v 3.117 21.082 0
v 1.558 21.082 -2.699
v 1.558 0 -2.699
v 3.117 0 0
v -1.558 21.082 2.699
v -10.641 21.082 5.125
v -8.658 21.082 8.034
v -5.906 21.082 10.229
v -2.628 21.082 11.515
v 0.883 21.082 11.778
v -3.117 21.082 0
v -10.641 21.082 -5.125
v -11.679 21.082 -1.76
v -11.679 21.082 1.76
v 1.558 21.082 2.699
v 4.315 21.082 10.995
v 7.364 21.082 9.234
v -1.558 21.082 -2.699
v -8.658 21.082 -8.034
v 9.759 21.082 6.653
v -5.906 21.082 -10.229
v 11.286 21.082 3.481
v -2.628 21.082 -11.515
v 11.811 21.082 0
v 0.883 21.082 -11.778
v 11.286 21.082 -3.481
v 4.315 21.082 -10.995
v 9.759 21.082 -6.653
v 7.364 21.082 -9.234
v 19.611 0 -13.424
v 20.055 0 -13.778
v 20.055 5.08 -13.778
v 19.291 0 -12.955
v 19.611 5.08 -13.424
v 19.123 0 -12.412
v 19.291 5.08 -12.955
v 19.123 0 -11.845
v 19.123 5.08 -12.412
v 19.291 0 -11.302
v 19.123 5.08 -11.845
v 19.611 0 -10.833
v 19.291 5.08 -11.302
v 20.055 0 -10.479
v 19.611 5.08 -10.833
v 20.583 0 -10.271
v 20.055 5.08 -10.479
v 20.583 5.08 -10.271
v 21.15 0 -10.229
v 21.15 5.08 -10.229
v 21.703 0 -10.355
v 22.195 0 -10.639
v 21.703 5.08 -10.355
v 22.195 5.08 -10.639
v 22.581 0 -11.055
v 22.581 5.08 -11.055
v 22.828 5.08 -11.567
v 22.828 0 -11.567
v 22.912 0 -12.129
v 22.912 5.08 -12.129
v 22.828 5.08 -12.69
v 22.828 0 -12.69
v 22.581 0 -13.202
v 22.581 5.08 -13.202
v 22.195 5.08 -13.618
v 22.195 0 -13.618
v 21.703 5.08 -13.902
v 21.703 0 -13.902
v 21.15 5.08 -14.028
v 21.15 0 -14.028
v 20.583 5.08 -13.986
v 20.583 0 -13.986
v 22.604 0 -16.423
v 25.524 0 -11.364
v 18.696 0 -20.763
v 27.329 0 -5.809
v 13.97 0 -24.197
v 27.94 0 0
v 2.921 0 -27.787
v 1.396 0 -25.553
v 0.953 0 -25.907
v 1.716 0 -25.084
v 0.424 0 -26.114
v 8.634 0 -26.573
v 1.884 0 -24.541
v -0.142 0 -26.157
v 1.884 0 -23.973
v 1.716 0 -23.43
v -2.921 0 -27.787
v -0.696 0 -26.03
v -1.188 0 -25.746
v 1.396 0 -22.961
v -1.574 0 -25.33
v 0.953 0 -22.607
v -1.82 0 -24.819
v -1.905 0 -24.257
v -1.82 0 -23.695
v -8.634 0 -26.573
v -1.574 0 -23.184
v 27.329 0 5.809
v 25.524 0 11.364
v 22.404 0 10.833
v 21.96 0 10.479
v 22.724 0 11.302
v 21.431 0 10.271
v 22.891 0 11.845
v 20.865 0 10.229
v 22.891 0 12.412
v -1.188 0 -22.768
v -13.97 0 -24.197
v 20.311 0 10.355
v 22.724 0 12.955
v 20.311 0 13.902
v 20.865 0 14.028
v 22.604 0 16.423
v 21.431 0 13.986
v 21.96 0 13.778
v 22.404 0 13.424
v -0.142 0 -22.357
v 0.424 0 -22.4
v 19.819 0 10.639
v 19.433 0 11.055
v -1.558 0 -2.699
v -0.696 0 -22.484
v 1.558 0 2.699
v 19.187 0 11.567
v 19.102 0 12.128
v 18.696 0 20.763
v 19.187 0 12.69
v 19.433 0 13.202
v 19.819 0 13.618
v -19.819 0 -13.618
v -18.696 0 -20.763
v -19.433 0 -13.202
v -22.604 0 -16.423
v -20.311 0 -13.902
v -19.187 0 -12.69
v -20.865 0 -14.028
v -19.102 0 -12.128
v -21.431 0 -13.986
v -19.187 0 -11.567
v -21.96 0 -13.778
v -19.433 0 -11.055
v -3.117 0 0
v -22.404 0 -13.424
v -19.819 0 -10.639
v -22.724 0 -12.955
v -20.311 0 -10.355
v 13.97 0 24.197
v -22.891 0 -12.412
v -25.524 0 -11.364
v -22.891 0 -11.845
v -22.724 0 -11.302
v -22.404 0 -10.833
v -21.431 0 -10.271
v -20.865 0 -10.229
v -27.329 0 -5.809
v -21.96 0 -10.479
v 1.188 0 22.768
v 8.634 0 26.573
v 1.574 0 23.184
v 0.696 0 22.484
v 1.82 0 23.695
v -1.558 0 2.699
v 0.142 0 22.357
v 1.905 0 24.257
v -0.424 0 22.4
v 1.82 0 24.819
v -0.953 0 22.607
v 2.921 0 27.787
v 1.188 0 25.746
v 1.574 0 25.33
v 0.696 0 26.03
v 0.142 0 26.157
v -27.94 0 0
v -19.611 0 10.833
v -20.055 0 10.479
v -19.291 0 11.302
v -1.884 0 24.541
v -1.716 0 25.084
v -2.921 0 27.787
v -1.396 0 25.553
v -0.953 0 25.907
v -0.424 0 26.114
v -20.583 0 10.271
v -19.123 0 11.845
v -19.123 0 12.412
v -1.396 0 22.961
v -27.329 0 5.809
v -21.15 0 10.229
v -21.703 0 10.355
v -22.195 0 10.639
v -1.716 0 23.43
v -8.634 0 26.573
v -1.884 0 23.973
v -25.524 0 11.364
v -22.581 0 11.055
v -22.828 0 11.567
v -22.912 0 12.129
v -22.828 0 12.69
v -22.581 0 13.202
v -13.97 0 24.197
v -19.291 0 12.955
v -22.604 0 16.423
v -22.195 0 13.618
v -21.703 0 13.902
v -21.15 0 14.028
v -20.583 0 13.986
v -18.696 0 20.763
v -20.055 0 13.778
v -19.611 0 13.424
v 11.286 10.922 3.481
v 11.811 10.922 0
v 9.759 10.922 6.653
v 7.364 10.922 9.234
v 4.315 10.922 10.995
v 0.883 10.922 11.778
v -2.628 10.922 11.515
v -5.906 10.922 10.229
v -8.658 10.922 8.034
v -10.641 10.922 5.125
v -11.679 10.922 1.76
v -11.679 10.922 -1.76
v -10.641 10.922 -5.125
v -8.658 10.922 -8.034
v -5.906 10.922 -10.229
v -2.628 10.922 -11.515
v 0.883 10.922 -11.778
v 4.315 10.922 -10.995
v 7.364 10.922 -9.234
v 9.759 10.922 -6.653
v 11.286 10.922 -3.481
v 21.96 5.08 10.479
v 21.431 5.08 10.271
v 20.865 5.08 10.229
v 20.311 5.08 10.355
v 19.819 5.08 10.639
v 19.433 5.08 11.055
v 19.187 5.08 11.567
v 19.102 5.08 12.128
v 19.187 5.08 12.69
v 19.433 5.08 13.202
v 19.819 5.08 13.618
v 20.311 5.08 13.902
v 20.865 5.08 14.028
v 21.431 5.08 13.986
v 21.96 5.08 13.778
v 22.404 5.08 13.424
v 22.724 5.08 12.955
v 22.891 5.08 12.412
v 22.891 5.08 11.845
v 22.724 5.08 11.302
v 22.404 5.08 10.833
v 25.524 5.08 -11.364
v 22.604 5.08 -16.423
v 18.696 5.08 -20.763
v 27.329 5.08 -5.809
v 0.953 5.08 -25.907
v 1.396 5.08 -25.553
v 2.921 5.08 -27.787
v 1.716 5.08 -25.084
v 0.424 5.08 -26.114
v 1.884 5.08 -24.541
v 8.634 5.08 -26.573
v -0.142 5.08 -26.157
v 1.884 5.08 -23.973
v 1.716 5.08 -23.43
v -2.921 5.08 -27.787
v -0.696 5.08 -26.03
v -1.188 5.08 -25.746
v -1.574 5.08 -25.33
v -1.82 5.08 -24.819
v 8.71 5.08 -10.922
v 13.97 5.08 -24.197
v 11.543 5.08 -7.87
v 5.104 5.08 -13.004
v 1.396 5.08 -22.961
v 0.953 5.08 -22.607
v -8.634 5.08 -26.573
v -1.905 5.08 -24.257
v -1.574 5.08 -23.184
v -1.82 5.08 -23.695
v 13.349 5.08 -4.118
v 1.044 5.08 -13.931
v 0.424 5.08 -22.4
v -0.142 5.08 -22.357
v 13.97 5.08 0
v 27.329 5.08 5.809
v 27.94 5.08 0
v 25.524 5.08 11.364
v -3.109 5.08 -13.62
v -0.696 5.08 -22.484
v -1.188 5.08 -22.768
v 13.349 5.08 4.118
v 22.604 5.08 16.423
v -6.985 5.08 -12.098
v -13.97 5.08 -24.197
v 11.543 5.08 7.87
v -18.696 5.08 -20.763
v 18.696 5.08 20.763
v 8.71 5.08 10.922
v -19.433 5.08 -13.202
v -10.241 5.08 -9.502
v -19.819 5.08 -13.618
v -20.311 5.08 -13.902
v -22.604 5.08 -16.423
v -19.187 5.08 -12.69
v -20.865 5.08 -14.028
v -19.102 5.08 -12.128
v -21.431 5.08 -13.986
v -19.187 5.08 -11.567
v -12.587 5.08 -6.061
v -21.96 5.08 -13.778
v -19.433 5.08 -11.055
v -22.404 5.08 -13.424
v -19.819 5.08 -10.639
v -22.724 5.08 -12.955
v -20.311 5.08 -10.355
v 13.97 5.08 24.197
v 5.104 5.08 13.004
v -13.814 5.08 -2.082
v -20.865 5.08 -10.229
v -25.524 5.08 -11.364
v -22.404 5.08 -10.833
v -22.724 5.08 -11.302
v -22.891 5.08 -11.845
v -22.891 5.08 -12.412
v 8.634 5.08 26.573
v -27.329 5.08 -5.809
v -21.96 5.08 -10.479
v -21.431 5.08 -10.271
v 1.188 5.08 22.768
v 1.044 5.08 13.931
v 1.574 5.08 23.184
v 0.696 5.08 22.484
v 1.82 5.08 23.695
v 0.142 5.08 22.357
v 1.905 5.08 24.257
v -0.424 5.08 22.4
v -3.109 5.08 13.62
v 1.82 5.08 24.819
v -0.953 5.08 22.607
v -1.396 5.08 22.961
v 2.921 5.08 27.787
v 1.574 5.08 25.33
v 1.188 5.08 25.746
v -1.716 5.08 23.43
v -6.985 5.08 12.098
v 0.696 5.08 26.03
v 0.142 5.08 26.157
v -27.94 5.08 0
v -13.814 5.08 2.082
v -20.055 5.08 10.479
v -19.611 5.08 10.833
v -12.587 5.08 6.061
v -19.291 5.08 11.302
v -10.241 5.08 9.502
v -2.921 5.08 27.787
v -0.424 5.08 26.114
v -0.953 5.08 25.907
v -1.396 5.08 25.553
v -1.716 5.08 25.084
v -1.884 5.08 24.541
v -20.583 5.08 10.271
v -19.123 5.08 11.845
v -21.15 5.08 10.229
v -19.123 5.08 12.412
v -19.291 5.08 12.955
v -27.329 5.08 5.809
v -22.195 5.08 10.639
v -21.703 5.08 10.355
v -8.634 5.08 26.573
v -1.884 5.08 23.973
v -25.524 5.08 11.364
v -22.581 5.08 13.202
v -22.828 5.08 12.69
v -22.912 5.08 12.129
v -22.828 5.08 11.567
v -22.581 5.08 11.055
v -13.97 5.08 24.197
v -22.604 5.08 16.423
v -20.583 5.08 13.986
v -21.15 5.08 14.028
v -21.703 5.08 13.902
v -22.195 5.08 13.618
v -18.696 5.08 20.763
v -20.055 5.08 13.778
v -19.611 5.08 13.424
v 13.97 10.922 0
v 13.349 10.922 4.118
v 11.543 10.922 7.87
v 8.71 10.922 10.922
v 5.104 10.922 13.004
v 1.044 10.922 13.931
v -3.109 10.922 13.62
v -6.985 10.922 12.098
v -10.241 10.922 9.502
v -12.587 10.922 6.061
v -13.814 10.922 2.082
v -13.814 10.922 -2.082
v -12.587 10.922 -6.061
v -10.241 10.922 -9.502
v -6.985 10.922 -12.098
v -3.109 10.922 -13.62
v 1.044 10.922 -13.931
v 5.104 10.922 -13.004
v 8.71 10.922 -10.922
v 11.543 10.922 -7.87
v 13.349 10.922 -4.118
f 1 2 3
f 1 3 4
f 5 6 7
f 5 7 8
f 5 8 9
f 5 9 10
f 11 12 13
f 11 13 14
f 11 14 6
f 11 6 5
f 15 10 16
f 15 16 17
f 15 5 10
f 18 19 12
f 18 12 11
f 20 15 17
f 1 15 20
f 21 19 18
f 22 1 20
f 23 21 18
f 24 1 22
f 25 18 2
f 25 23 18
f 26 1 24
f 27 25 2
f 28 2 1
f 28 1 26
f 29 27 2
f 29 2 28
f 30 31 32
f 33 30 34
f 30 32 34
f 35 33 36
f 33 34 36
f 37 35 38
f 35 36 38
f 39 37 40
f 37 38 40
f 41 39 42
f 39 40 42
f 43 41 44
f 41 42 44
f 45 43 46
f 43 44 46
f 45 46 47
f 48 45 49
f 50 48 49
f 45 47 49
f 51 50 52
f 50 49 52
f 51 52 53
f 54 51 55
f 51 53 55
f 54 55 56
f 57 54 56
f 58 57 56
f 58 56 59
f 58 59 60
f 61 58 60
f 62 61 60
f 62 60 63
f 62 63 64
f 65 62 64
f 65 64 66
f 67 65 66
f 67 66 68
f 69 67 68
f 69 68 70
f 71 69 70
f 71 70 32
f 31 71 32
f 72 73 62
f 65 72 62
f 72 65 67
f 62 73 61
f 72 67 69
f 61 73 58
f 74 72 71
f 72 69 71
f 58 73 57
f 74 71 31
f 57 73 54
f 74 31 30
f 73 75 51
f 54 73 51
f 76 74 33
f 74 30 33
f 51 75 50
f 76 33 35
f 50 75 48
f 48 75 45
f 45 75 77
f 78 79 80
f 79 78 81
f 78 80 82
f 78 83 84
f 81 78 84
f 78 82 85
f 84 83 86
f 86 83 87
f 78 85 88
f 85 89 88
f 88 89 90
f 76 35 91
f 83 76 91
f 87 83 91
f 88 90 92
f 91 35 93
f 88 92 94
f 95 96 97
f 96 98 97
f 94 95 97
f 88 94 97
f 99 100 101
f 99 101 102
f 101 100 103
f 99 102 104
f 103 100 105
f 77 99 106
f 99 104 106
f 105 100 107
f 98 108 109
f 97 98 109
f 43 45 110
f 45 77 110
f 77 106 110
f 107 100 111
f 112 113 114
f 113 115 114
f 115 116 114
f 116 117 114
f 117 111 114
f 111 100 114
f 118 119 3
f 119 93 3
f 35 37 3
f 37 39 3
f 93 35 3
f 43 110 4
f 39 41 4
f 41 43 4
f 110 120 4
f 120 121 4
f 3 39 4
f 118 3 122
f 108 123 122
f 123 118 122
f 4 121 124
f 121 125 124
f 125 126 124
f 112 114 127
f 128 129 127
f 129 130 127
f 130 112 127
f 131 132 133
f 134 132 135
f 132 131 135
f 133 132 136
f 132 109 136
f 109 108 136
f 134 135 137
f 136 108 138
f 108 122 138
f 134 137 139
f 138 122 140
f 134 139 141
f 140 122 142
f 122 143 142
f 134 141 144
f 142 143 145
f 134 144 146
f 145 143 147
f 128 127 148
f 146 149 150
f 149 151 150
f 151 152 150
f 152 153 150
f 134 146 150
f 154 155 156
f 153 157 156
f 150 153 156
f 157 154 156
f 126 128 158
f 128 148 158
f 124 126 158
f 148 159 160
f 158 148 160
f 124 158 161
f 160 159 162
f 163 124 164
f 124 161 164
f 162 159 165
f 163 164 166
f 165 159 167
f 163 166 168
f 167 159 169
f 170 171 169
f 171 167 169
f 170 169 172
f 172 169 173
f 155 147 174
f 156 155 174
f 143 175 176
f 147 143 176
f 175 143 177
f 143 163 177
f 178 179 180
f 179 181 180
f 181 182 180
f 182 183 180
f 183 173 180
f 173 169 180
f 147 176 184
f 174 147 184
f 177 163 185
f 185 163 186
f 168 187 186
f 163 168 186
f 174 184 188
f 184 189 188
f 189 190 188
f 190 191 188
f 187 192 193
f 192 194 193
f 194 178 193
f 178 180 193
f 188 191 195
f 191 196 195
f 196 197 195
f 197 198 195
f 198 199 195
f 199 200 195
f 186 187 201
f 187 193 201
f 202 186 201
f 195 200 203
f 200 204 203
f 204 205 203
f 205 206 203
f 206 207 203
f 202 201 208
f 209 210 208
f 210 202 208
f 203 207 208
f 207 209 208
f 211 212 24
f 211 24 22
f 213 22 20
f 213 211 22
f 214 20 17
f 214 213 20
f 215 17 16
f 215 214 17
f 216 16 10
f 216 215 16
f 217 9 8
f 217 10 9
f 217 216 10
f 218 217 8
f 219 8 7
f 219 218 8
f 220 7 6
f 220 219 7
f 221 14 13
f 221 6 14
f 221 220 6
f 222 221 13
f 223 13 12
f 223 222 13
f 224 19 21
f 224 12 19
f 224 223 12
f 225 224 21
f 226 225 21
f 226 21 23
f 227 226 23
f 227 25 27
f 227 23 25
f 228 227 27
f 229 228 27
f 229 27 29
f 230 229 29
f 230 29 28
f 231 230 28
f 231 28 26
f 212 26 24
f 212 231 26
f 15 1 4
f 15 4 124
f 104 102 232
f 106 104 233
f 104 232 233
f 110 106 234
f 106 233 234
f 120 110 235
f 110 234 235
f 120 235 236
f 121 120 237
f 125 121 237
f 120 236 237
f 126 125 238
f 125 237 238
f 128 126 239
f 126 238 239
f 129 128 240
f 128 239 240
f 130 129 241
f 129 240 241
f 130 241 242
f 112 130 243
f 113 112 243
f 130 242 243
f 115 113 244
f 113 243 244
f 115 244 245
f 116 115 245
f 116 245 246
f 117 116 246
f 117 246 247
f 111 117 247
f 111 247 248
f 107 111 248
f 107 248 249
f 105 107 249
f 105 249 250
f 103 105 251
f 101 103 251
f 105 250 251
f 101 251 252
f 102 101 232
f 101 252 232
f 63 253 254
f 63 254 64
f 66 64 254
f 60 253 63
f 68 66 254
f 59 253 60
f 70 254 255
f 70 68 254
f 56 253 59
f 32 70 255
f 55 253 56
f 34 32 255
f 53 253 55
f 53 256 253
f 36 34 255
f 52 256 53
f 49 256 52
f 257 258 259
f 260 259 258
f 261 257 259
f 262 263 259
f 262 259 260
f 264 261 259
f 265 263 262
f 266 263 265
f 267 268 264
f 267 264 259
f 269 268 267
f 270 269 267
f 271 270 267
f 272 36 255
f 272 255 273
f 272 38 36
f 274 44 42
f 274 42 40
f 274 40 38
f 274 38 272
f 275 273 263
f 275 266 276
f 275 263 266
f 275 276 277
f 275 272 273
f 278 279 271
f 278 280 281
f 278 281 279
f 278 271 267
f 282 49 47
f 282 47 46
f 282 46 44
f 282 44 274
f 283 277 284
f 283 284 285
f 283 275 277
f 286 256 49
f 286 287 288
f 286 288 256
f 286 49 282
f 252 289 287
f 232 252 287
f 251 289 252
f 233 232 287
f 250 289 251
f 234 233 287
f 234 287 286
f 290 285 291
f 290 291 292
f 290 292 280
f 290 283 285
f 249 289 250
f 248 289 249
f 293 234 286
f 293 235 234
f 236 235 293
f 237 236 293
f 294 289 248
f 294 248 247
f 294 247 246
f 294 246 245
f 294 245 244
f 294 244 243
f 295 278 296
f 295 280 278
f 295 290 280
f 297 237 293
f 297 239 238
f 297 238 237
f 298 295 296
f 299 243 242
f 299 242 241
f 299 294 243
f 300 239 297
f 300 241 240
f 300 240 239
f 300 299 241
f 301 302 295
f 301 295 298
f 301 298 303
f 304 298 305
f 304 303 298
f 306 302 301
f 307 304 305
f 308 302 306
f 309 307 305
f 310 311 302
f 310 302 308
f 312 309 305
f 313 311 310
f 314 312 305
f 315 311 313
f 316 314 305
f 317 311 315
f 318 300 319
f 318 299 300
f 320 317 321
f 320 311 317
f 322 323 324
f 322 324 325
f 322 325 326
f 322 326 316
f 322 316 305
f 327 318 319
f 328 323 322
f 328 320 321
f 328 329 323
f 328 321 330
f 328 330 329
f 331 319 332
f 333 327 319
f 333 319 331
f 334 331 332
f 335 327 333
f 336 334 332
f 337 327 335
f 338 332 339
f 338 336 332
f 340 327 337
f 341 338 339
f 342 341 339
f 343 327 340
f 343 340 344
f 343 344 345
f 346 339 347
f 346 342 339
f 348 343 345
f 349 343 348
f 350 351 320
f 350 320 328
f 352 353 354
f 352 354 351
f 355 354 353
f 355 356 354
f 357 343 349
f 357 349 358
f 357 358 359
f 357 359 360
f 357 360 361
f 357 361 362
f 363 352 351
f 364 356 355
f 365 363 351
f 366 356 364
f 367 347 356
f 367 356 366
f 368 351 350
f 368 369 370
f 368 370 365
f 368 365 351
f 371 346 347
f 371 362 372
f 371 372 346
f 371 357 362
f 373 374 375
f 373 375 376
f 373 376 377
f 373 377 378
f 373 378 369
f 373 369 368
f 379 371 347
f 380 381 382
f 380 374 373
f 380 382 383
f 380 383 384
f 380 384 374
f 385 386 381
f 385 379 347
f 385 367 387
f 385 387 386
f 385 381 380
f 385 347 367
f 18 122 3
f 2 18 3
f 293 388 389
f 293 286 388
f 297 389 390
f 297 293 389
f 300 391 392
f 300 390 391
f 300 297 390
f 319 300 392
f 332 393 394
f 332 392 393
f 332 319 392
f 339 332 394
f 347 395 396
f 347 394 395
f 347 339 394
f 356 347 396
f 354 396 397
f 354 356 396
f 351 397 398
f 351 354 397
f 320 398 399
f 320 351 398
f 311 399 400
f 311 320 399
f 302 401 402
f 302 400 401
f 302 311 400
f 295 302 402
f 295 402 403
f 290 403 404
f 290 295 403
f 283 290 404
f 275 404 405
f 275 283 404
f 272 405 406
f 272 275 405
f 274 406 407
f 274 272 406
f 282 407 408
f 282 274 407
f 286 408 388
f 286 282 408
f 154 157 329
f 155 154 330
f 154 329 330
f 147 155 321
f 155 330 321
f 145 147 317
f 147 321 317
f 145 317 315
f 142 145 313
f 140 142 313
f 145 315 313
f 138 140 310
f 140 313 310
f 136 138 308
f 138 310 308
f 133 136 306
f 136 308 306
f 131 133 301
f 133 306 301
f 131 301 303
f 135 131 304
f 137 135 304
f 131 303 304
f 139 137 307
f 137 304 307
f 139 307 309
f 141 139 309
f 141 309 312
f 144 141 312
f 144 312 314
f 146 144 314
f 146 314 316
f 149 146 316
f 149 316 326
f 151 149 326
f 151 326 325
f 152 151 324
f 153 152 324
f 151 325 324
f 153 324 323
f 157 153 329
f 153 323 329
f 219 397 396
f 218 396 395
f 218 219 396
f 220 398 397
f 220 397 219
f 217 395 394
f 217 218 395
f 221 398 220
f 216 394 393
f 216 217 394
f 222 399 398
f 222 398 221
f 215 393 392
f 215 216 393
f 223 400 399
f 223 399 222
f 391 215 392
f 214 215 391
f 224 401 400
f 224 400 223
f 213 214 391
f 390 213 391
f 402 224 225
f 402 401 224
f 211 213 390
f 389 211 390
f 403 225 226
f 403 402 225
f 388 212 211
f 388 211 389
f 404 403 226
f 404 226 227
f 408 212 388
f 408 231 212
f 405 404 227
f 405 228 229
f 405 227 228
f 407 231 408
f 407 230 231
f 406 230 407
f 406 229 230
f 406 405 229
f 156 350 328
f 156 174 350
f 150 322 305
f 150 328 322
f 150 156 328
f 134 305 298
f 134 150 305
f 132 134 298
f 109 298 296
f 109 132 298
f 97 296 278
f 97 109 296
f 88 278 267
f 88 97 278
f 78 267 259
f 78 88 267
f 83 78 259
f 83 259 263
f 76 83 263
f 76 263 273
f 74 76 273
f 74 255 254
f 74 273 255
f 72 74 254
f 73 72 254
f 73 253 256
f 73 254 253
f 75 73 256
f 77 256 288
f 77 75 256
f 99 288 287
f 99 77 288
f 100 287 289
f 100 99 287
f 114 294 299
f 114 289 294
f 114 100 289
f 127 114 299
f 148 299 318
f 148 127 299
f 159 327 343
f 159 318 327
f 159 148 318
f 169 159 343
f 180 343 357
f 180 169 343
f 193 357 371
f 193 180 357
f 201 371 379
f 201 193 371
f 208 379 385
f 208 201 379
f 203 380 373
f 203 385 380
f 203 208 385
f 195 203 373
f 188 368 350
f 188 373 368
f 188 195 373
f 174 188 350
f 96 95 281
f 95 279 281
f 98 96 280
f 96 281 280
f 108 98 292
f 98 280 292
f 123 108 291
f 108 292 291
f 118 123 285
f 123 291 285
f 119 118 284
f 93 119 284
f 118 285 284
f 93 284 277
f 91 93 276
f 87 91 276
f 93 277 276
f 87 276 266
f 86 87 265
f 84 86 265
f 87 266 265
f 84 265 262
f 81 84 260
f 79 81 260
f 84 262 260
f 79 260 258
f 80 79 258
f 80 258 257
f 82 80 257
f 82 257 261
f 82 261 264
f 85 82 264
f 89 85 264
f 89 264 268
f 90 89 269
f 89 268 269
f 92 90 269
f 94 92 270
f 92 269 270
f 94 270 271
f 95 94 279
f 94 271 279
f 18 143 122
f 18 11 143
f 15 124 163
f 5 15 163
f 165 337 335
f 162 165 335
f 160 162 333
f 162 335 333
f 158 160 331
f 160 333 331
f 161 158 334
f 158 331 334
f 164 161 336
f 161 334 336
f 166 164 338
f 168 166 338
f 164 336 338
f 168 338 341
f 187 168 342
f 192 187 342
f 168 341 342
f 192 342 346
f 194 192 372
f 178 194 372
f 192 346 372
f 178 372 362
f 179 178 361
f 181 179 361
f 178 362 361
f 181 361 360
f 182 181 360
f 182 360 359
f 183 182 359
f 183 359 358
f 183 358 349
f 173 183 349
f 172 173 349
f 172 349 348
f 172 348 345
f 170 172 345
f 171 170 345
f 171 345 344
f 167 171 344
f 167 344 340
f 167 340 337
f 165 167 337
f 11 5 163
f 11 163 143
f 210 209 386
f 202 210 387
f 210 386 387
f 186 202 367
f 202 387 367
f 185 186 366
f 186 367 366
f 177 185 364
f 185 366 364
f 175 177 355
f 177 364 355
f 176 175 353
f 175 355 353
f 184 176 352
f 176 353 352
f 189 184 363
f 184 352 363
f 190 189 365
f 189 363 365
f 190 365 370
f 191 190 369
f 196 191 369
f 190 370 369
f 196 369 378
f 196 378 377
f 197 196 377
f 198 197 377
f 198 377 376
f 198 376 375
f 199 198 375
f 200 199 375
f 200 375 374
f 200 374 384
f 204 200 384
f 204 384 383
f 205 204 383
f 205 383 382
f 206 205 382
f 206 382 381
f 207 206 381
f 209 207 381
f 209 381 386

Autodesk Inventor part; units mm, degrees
ref_plane "YZ Plane" through (0, 0, 0) normal (1, 0, 0) x (0, 1, 0)
ref_plane "XZ Plane" through (0, 0, 0) normal (0, 1, 0) x (-1, 0, 0)
ref_plane "XY Plane" through (0, 0, 0) normal (0, 0, 1) x (1, 0, 0)
sketch "Sketch1" plane through (0, 0, 0) normal (0, 1, 0) x (-1, 0, 0)
  circle A0 centre (0, 0) radius 27.94
  dimension "d0" = 55.88
extrude "Extrusion1" add sketch "Sketch1" along normal blind 5.08
sketch "Sketch2" plane through (0, 5.08, 0) normal (0, 1, 0) x (1, 0, 0)
  circle A0 centre (0, 0) radius 13.97
  dimension "d3" = 27.94
extrude "Extrusion2" add sketch "Sketch2" along normal blind 5.842
sketch "Sketch3" plane through (0, 10.922, 0) normal (0, 1, 0) x (1, 0, 0)
  circle A0 centre (0, 0) radius 11.811
  dimension "d6" = 23.622
extrude "Extrusion3" add sketch "Sketch3" along normal blind 10.16
sketch "Sketch5" plane through (0, 21.082, 0) normal (0, 1, 0) x (1, 0, 0)
  line L0 (0, 0) -> (0, 2.667)
  line L1 (-3.1168, 0) -> (-1.5584, 2.6992)
  line L2 (-1.5584, 2.6992) -> (1.5584, 2.6992)
  line L3 (1.5584, 2.6992) -> (3.1168, 0)
  line L4 (3.1168, 0) -> (1.5584, -2.6992)
  line L5 (1.5584, -2.6992) -> (-1.5584, -2.6992)
  line L6 (-1.5584, -2.6992) -> (-3.1168, 0)
  dimension "d10" = 2.667
extrude "Extrusion4" cut sketch "Sketch5" against normal blind 25.4
sketch "Sketch6" plane through (0, 5.08, 0) normal (0, 1, 0) x (1, 0, 0)
  circle A0 centre (0, 0) radius 27.94 projected
  line L0 (0, -27.94) -> (0, -26.162)
  line L1 (0, -26.162) -> (0, -24.257)
  circle A1 centre (0, -24.257) radius 1.905
  dimension "d13" = 1.778
  dimension "d14" = 1.905
extrude "Extrusion5" cut sketch "Sketch6" against normal blind 25.4 contours A1
sketch "Sketch7" plane through (0, 21.082, 0) normal (0, 1, 0) x (1, 0, 0)
  point P0 (0, 0)
  point P1 (0, 0)
pattern_circular "Circular Pattern1" count 6 over 360 about axis through (0, 21.082, 0) along (0, 1, 0) of "Extrusion5"
properties part number "Wheel Mount"
